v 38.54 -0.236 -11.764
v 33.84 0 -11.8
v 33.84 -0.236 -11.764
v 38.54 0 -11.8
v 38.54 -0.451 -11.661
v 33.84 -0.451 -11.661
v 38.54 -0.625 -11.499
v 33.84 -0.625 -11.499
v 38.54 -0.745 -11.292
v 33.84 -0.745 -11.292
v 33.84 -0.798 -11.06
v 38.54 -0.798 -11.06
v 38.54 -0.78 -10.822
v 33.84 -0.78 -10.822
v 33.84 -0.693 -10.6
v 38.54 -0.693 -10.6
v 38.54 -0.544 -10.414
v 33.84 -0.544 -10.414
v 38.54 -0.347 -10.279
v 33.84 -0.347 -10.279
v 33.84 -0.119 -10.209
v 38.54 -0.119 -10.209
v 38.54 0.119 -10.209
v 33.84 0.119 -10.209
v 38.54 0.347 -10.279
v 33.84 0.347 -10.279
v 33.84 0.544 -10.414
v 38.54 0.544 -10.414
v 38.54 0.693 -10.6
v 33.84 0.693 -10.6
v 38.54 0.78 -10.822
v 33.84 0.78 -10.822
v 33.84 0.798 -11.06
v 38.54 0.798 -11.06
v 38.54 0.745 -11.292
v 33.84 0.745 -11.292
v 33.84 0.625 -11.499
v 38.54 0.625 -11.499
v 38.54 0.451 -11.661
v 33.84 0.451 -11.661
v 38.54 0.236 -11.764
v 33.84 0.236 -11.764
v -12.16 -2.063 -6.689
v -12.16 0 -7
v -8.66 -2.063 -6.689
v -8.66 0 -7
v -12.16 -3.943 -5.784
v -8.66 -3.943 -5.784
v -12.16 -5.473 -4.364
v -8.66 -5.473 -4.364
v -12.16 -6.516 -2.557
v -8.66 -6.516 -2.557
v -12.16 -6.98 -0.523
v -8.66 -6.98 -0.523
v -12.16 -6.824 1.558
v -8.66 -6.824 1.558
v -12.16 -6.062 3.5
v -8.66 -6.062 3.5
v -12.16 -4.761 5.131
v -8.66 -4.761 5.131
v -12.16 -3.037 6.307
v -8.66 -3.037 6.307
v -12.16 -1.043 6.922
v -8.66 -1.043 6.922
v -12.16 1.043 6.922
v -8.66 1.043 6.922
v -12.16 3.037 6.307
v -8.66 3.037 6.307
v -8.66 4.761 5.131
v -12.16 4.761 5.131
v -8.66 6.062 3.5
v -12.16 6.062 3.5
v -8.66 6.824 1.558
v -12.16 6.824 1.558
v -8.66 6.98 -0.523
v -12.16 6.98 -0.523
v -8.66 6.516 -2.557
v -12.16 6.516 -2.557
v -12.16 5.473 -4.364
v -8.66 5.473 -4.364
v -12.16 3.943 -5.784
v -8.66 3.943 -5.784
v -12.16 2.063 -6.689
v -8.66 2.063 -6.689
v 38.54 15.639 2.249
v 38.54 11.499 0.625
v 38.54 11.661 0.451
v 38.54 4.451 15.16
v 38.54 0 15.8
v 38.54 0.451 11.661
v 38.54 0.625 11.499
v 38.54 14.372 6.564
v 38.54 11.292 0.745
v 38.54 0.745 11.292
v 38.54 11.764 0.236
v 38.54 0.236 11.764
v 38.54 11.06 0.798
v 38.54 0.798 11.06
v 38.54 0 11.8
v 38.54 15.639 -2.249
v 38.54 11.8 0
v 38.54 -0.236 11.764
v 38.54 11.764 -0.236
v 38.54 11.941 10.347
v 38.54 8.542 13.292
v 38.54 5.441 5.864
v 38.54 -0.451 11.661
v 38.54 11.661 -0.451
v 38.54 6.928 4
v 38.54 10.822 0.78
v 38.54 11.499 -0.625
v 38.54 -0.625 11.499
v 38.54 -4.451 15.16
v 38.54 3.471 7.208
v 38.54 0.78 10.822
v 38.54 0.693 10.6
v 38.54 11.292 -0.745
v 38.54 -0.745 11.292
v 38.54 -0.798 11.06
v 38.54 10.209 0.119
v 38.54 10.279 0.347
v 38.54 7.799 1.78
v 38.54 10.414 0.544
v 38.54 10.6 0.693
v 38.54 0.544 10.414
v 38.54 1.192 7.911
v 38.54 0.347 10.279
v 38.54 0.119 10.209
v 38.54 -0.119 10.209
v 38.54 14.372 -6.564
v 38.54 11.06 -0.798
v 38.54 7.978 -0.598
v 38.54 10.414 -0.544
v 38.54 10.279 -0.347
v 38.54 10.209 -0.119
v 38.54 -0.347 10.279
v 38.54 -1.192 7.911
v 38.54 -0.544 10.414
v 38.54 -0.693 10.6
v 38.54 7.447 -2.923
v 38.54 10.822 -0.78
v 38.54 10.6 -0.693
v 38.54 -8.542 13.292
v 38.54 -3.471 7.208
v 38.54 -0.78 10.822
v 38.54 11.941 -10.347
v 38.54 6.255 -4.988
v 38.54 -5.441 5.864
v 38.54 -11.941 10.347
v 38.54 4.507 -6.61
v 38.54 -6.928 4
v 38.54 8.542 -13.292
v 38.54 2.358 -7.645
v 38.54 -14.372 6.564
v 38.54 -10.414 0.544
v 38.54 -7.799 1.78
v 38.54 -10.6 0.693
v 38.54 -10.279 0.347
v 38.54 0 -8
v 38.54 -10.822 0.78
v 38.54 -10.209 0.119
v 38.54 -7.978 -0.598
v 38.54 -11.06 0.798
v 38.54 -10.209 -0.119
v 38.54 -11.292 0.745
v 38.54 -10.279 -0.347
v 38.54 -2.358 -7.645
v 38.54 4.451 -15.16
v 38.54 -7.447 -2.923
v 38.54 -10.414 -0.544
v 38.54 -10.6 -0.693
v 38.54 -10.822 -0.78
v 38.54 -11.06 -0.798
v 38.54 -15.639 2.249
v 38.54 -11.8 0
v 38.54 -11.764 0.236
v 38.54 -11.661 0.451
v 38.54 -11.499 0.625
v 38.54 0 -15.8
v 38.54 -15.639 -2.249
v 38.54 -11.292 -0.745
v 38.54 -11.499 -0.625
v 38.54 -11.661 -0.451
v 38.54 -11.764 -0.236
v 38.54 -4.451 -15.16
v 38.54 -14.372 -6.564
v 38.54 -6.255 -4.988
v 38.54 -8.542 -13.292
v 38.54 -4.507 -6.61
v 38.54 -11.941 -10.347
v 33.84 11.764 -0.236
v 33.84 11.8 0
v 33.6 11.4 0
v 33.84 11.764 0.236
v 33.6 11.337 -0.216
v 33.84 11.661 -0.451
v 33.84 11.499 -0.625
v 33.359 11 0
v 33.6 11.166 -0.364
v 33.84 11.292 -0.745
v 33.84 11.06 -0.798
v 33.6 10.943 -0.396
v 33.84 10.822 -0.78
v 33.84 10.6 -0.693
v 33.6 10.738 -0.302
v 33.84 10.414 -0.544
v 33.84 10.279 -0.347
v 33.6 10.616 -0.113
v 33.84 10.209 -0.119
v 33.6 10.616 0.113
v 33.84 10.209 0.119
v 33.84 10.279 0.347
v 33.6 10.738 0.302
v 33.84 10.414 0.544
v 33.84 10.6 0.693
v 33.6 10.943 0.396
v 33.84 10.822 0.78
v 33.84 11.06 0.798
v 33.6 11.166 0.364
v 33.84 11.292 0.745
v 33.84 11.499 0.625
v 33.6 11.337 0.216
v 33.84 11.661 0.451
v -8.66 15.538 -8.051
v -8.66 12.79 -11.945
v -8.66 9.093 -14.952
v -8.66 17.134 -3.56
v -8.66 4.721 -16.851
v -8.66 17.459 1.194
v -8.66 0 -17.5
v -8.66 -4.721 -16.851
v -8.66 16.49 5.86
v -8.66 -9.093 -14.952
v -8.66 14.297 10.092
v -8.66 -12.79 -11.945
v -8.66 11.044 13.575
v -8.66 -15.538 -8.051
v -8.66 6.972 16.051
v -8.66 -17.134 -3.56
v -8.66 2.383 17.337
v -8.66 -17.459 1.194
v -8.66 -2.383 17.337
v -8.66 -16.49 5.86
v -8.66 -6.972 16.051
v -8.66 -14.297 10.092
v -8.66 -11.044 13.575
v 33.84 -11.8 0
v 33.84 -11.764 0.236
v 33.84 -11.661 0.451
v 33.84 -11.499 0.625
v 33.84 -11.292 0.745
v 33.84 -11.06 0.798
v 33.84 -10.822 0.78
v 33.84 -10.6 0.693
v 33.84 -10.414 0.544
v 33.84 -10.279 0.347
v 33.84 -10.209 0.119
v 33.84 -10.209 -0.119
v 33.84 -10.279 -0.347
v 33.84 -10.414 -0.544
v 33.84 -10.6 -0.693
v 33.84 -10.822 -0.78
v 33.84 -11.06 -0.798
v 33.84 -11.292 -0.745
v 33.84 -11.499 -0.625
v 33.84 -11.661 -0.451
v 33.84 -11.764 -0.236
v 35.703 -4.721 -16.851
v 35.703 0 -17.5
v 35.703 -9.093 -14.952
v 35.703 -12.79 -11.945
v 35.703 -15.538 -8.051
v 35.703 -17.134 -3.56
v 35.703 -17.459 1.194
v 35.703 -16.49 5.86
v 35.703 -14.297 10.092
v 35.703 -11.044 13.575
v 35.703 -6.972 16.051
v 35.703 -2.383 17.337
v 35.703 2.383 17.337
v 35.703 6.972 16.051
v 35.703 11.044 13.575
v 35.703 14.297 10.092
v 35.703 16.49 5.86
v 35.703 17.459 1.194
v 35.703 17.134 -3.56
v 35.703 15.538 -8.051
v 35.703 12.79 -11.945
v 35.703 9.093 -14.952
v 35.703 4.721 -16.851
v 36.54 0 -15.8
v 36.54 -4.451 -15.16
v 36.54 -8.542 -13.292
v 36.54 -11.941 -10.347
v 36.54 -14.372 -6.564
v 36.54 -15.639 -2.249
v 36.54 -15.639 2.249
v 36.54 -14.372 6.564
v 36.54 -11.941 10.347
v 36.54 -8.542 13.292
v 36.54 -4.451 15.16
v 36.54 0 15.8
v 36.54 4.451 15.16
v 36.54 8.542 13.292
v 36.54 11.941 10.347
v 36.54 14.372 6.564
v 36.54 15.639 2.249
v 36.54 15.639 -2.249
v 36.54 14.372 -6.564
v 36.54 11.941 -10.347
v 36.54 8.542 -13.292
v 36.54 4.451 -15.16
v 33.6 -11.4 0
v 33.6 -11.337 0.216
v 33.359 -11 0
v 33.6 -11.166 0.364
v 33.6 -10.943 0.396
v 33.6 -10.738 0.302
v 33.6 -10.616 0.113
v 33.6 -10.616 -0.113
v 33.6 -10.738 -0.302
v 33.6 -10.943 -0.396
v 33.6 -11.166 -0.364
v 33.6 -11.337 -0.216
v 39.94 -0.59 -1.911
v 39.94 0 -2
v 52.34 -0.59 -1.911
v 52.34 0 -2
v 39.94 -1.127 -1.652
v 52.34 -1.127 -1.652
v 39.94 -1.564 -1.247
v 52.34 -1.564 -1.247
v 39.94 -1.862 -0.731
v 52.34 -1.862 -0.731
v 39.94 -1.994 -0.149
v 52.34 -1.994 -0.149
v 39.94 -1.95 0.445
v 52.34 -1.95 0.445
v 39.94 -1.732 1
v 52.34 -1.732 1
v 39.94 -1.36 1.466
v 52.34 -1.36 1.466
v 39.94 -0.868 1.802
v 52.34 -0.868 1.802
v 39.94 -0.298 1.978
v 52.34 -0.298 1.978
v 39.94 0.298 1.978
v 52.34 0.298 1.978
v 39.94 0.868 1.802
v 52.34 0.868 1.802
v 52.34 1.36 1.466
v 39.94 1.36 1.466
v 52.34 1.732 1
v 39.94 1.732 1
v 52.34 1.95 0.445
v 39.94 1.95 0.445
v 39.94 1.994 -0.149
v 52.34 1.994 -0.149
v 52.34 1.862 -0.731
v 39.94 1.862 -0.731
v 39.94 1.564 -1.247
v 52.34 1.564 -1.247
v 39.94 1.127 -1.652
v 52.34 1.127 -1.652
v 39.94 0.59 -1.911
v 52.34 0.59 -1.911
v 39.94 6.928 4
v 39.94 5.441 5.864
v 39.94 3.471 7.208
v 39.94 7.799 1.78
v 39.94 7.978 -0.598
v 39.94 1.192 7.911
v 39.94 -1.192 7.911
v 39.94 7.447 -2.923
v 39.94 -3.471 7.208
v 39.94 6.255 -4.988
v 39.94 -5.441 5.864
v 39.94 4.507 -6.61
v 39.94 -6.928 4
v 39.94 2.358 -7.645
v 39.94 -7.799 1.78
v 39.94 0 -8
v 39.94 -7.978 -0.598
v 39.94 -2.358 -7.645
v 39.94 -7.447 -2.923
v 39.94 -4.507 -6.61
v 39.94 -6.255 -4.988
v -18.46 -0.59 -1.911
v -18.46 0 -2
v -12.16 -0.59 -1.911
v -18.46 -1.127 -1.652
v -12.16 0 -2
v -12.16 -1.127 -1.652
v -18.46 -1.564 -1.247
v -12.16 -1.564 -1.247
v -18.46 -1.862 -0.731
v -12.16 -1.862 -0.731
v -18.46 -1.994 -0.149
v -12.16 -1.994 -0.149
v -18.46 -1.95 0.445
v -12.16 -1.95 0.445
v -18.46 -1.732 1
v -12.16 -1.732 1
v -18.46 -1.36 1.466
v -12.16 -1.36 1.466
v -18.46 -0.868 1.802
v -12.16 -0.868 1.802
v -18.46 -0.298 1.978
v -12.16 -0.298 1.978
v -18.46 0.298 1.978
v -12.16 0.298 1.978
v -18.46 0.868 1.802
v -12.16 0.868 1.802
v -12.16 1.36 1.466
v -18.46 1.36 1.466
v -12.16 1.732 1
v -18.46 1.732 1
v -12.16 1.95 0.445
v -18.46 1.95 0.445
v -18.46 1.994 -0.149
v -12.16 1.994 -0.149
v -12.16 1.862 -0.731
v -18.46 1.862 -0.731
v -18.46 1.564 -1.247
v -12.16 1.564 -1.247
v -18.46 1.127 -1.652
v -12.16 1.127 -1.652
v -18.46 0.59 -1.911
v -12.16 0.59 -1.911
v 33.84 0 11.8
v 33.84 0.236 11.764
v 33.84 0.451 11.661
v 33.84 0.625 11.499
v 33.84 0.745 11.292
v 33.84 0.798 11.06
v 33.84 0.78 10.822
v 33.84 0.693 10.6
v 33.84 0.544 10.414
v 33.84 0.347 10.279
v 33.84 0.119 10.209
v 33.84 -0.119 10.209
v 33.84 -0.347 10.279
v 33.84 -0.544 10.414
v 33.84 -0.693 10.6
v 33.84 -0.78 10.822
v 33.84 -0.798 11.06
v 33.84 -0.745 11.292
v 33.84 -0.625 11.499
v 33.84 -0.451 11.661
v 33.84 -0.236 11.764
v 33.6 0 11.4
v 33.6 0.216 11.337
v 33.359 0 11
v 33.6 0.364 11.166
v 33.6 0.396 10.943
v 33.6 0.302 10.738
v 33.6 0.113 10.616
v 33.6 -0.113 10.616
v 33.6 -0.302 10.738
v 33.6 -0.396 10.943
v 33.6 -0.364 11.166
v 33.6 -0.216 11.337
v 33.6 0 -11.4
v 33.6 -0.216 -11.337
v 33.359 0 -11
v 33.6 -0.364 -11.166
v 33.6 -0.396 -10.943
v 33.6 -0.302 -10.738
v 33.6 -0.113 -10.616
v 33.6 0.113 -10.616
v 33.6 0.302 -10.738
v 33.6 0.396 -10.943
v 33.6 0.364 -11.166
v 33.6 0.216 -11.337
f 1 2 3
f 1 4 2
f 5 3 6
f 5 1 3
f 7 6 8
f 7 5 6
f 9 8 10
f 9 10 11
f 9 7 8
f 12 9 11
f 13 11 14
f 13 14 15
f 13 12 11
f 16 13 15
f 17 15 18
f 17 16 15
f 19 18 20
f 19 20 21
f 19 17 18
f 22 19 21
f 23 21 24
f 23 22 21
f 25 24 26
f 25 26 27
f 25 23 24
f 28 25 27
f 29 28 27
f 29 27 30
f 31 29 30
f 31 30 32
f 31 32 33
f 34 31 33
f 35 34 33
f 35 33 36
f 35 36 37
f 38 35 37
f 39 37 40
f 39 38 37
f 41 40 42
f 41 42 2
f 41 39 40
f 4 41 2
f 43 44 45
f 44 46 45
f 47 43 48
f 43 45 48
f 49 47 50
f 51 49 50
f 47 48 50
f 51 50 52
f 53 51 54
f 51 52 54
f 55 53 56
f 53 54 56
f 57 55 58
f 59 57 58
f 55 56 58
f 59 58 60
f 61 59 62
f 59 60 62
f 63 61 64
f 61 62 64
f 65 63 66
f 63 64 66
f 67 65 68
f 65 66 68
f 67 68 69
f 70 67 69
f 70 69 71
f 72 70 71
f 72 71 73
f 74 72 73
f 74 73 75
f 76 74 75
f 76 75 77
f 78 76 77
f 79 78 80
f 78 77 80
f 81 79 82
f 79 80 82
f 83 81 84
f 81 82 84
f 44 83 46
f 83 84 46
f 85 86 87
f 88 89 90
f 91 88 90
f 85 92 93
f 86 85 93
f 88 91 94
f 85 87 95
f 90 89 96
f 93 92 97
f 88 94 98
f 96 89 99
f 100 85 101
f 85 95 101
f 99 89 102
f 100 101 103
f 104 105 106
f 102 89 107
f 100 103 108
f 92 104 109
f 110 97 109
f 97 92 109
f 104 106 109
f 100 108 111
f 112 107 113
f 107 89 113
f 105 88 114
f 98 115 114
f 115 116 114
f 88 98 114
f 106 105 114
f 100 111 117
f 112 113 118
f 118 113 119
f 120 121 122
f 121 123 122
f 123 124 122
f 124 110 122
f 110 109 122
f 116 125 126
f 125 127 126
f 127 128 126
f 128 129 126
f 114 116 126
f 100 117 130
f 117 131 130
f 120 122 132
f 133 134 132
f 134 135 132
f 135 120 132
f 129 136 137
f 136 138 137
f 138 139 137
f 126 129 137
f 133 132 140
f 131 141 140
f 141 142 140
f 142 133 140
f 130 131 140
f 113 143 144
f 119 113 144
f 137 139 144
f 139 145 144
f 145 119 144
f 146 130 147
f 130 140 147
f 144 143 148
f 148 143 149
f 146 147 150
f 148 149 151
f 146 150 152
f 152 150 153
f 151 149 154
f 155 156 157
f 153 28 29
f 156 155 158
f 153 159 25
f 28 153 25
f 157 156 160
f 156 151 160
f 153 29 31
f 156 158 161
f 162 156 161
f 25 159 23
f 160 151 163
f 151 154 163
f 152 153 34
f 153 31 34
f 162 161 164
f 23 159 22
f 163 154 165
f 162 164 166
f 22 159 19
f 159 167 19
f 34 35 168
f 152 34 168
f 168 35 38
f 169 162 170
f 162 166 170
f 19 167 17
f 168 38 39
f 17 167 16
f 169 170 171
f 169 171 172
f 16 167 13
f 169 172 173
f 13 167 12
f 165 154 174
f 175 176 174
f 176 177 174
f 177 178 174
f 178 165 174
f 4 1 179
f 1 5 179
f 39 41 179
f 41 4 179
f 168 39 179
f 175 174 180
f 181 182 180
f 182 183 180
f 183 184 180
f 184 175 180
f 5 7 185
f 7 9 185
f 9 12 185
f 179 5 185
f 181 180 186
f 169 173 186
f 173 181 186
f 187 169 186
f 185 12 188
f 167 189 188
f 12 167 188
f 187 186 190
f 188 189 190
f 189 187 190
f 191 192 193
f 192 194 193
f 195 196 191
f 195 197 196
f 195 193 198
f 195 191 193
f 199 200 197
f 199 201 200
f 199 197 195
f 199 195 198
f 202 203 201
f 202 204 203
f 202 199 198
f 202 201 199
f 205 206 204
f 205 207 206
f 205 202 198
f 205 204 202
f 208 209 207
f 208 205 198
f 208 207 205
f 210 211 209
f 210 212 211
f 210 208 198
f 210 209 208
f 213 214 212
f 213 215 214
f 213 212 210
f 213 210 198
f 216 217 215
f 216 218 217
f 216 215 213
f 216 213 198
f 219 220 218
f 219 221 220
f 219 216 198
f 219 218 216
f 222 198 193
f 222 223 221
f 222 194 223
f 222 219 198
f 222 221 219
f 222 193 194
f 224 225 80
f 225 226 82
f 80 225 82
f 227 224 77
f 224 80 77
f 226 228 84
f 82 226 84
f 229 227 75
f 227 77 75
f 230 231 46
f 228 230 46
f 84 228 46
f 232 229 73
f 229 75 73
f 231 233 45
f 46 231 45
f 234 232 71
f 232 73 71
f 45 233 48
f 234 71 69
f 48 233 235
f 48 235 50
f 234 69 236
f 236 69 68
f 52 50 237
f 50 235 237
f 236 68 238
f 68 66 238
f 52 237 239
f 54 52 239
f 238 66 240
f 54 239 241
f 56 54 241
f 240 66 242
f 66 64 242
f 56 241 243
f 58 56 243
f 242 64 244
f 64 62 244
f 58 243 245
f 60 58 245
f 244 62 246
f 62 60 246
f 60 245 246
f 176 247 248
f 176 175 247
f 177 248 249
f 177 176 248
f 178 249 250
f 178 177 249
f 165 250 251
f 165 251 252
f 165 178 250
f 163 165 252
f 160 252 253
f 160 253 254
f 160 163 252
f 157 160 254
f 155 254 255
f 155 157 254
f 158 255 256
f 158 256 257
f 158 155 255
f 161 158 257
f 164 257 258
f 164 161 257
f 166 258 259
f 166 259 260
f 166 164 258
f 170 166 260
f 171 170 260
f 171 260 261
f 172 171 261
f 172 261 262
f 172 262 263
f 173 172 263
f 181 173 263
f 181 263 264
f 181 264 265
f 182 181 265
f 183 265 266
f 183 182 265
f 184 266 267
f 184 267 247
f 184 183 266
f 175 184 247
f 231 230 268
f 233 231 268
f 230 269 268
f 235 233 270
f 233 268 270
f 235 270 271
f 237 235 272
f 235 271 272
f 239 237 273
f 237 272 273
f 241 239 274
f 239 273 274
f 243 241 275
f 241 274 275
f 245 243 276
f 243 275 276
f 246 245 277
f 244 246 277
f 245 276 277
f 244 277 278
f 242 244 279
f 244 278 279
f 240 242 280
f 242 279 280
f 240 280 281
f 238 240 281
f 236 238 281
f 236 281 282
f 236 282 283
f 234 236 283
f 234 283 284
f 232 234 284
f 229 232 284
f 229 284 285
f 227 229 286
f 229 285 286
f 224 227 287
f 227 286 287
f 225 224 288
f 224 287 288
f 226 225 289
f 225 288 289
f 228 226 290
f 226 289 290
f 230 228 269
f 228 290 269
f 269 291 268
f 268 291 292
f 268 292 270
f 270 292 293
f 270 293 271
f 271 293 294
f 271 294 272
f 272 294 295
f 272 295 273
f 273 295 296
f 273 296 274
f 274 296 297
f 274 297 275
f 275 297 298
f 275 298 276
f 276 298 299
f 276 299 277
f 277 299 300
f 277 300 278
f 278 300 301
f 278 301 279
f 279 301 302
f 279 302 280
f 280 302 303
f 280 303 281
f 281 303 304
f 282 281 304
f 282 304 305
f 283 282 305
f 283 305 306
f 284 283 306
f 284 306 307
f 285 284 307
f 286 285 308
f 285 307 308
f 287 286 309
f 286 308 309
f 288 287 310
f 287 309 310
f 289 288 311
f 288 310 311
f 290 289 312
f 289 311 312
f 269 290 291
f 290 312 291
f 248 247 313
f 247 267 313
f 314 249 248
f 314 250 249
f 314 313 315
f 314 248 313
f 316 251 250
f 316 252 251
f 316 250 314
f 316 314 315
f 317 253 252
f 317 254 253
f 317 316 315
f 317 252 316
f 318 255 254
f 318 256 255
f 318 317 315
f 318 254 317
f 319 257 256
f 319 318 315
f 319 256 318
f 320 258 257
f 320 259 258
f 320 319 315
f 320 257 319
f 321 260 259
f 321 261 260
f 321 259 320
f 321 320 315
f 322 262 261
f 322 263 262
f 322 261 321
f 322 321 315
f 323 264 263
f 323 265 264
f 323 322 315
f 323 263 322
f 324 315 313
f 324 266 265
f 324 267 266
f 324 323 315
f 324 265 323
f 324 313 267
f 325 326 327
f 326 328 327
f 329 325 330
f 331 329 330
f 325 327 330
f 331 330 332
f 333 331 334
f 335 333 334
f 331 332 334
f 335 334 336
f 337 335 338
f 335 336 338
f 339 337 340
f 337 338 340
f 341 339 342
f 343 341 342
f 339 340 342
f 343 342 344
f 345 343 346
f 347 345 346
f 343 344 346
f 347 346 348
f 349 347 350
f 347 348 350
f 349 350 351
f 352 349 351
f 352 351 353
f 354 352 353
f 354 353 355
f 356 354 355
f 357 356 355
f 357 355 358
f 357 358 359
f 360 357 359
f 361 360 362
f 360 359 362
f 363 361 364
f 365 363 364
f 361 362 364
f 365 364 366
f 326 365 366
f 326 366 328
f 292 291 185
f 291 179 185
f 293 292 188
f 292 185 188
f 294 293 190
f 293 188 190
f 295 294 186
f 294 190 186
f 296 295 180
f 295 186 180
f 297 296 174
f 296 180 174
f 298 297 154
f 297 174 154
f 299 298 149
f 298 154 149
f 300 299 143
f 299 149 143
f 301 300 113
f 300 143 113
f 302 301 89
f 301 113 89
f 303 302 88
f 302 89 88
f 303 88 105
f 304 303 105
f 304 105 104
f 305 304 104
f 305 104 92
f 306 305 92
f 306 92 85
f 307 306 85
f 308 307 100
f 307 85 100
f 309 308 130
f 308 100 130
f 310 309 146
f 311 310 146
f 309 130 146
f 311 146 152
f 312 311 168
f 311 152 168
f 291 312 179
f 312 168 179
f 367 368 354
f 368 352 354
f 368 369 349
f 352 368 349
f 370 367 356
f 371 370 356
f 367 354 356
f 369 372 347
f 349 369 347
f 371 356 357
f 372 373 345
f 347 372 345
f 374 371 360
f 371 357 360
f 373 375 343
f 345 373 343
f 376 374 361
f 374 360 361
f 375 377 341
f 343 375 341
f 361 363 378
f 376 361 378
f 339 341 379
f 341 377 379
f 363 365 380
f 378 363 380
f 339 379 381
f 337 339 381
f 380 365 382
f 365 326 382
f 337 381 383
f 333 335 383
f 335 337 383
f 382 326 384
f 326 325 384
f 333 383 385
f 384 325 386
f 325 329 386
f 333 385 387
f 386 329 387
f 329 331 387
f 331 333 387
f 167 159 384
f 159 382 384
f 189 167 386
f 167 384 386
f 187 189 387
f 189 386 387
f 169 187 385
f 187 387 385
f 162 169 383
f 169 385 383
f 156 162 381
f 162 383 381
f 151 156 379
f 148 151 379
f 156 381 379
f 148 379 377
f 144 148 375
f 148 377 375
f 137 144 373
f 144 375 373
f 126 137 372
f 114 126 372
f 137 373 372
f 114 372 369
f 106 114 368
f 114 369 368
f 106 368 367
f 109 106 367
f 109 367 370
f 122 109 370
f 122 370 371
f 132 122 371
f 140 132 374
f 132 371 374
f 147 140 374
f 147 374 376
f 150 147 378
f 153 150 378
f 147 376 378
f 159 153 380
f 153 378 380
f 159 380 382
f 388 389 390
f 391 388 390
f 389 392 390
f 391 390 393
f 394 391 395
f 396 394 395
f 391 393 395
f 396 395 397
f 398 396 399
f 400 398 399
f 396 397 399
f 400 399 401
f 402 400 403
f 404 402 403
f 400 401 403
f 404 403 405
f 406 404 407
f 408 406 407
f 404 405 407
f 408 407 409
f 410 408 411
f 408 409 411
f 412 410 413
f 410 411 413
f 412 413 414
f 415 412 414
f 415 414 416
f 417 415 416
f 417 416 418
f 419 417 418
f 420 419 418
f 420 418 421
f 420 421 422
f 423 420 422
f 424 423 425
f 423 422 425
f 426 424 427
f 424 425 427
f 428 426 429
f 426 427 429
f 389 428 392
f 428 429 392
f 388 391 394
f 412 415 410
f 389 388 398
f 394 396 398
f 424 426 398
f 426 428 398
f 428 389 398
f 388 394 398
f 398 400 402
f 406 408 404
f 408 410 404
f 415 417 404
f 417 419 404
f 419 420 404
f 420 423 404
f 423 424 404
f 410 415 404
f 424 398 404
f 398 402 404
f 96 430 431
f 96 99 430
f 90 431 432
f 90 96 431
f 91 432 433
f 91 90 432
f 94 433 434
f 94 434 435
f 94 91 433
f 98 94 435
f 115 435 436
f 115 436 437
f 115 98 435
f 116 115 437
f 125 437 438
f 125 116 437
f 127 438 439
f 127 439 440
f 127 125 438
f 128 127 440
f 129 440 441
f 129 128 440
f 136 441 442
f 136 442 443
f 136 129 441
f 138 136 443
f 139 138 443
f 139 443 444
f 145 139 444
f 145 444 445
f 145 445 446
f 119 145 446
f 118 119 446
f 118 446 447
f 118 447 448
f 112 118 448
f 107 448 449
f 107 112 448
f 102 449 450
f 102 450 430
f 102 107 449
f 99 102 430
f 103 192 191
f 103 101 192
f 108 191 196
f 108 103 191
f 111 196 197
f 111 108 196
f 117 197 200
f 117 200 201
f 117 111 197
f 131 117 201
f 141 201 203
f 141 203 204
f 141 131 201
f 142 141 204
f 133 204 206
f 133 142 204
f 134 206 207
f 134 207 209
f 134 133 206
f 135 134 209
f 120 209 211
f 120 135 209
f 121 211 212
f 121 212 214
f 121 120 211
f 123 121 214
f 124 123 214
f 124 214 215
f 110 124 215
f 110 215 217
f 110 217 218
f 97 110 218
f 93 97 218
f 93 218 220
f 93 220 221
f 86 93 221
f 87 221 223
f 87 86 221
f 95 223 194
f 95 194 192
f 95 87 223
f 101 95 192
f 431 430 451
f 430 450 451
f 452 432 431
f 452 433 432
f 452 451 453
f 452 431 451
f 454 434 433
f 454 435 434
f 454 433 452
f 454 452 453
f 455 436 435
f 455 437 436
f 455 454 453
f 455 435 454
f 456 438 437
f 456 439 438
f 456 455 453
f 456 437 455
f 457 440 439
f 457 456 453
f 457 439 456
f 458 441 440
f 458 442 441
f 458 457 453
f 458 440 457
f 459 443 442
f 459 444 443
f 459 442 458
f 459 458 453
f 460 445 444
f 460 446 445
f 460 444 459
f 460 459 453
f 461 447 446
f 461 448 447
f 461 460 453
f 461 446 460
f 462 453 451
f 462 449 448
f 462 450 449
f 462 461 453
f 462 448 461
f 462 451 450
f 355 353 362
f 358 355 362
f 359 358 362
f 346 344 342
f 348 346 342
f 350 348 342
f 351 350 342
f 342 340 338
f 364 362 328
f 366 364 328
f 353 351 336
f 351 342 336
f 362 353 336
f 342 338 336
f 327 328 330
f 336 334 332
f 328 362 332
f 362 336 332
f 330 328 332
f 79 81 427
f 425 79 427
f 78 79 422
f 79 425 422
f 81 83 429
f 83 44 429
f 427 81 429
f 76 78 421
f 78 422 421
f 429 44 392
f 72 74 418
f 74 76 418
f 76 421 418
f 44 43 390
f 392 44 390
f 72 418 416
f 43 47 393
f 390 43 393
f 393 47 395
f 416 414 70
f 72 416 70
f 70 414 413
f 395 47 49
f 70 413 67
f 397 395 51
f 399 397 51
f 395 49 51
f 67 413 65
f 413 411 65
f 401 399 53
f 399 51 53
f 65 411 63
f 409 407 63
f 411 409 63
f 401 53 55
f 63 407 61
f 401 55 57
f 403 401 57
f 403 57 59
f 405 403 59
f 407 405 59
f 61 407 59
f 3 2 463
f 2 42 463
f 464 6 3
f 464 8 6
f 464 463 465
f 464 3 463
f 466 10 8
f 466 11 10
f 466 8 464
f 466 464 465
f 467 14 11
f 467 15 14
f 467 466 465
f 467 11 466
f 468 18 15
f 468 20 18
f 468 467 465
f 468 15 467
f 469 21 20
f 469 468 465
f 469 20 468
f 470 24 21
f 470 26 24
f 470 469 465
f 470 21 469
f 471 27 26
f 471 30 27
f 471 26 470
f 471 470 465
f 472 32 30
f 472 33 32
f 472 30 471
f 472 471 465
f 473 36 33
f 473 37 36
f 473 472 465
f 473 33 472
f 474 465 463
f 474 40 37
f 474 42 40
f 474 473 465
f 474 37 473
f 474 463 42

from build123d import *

# Parameters (mm, degrees)
R_P_TITION_CIRCULAIRE7_COUNT = 4


with BuildPart() as part:
    # Esquisse1 → Révolution1 (revolve)
    with BuildSketch(Plane(origin=(0, 0, 0), x_dir=(1, 0, 0), z_dir=(0, 1, 0))):
        Polygon((-18.460120385, 0), (-18.460120385, 2), (-12.160120385, 2), (-12.160120385, 7), (-8.660120385, 7), (-8.660120385, 17.5), (35.703488783, 17.5), (36.539879615, 15.8), (38.539879615, 15.8), (38.539879615, 8), (39.939879615, 8), (39.939879615, 2), (52.339879615, 2), (52.339879615, 0), align=None)
    revolve(axis=Axis((52.339879615, 0, 0), (-1, 0, 0)))

    # Esquisse4 → Trou taraudé M22 (revolve, cut)
    with BuildSketch(Plane(origin=(38.539879615, 0, -11), x_dir=(0, 0, -1), z_dir=(0, 1, 0))):
        Polygon((0, 0), (0, 5.180688495), (0.8, 4.7), (0.8, 0), align=None)
    trou_taraud_m22 = revolve(axis=Axis((44.889879615, 0, -11), (-1, 0, 0)), mode=Mode.SUBTRACT)

    # Répétition circulaire7: Trou taraudé M22 ×4 about axis
    r_p_tition_circulaire7_axis = Axis((0, 0, 0), (1, 0, 0))
    for i in range(1, R_P_TITION_CIRCULAIRE7_COUNT):
        add(trou_taraud_m22.rotate(r_p_tition_circulaire7_axis, i * 360 / R_P_TITION_CIRCULAIRE7_COUNT), mode=Mode.SUBTRACT)


solid = part.part
